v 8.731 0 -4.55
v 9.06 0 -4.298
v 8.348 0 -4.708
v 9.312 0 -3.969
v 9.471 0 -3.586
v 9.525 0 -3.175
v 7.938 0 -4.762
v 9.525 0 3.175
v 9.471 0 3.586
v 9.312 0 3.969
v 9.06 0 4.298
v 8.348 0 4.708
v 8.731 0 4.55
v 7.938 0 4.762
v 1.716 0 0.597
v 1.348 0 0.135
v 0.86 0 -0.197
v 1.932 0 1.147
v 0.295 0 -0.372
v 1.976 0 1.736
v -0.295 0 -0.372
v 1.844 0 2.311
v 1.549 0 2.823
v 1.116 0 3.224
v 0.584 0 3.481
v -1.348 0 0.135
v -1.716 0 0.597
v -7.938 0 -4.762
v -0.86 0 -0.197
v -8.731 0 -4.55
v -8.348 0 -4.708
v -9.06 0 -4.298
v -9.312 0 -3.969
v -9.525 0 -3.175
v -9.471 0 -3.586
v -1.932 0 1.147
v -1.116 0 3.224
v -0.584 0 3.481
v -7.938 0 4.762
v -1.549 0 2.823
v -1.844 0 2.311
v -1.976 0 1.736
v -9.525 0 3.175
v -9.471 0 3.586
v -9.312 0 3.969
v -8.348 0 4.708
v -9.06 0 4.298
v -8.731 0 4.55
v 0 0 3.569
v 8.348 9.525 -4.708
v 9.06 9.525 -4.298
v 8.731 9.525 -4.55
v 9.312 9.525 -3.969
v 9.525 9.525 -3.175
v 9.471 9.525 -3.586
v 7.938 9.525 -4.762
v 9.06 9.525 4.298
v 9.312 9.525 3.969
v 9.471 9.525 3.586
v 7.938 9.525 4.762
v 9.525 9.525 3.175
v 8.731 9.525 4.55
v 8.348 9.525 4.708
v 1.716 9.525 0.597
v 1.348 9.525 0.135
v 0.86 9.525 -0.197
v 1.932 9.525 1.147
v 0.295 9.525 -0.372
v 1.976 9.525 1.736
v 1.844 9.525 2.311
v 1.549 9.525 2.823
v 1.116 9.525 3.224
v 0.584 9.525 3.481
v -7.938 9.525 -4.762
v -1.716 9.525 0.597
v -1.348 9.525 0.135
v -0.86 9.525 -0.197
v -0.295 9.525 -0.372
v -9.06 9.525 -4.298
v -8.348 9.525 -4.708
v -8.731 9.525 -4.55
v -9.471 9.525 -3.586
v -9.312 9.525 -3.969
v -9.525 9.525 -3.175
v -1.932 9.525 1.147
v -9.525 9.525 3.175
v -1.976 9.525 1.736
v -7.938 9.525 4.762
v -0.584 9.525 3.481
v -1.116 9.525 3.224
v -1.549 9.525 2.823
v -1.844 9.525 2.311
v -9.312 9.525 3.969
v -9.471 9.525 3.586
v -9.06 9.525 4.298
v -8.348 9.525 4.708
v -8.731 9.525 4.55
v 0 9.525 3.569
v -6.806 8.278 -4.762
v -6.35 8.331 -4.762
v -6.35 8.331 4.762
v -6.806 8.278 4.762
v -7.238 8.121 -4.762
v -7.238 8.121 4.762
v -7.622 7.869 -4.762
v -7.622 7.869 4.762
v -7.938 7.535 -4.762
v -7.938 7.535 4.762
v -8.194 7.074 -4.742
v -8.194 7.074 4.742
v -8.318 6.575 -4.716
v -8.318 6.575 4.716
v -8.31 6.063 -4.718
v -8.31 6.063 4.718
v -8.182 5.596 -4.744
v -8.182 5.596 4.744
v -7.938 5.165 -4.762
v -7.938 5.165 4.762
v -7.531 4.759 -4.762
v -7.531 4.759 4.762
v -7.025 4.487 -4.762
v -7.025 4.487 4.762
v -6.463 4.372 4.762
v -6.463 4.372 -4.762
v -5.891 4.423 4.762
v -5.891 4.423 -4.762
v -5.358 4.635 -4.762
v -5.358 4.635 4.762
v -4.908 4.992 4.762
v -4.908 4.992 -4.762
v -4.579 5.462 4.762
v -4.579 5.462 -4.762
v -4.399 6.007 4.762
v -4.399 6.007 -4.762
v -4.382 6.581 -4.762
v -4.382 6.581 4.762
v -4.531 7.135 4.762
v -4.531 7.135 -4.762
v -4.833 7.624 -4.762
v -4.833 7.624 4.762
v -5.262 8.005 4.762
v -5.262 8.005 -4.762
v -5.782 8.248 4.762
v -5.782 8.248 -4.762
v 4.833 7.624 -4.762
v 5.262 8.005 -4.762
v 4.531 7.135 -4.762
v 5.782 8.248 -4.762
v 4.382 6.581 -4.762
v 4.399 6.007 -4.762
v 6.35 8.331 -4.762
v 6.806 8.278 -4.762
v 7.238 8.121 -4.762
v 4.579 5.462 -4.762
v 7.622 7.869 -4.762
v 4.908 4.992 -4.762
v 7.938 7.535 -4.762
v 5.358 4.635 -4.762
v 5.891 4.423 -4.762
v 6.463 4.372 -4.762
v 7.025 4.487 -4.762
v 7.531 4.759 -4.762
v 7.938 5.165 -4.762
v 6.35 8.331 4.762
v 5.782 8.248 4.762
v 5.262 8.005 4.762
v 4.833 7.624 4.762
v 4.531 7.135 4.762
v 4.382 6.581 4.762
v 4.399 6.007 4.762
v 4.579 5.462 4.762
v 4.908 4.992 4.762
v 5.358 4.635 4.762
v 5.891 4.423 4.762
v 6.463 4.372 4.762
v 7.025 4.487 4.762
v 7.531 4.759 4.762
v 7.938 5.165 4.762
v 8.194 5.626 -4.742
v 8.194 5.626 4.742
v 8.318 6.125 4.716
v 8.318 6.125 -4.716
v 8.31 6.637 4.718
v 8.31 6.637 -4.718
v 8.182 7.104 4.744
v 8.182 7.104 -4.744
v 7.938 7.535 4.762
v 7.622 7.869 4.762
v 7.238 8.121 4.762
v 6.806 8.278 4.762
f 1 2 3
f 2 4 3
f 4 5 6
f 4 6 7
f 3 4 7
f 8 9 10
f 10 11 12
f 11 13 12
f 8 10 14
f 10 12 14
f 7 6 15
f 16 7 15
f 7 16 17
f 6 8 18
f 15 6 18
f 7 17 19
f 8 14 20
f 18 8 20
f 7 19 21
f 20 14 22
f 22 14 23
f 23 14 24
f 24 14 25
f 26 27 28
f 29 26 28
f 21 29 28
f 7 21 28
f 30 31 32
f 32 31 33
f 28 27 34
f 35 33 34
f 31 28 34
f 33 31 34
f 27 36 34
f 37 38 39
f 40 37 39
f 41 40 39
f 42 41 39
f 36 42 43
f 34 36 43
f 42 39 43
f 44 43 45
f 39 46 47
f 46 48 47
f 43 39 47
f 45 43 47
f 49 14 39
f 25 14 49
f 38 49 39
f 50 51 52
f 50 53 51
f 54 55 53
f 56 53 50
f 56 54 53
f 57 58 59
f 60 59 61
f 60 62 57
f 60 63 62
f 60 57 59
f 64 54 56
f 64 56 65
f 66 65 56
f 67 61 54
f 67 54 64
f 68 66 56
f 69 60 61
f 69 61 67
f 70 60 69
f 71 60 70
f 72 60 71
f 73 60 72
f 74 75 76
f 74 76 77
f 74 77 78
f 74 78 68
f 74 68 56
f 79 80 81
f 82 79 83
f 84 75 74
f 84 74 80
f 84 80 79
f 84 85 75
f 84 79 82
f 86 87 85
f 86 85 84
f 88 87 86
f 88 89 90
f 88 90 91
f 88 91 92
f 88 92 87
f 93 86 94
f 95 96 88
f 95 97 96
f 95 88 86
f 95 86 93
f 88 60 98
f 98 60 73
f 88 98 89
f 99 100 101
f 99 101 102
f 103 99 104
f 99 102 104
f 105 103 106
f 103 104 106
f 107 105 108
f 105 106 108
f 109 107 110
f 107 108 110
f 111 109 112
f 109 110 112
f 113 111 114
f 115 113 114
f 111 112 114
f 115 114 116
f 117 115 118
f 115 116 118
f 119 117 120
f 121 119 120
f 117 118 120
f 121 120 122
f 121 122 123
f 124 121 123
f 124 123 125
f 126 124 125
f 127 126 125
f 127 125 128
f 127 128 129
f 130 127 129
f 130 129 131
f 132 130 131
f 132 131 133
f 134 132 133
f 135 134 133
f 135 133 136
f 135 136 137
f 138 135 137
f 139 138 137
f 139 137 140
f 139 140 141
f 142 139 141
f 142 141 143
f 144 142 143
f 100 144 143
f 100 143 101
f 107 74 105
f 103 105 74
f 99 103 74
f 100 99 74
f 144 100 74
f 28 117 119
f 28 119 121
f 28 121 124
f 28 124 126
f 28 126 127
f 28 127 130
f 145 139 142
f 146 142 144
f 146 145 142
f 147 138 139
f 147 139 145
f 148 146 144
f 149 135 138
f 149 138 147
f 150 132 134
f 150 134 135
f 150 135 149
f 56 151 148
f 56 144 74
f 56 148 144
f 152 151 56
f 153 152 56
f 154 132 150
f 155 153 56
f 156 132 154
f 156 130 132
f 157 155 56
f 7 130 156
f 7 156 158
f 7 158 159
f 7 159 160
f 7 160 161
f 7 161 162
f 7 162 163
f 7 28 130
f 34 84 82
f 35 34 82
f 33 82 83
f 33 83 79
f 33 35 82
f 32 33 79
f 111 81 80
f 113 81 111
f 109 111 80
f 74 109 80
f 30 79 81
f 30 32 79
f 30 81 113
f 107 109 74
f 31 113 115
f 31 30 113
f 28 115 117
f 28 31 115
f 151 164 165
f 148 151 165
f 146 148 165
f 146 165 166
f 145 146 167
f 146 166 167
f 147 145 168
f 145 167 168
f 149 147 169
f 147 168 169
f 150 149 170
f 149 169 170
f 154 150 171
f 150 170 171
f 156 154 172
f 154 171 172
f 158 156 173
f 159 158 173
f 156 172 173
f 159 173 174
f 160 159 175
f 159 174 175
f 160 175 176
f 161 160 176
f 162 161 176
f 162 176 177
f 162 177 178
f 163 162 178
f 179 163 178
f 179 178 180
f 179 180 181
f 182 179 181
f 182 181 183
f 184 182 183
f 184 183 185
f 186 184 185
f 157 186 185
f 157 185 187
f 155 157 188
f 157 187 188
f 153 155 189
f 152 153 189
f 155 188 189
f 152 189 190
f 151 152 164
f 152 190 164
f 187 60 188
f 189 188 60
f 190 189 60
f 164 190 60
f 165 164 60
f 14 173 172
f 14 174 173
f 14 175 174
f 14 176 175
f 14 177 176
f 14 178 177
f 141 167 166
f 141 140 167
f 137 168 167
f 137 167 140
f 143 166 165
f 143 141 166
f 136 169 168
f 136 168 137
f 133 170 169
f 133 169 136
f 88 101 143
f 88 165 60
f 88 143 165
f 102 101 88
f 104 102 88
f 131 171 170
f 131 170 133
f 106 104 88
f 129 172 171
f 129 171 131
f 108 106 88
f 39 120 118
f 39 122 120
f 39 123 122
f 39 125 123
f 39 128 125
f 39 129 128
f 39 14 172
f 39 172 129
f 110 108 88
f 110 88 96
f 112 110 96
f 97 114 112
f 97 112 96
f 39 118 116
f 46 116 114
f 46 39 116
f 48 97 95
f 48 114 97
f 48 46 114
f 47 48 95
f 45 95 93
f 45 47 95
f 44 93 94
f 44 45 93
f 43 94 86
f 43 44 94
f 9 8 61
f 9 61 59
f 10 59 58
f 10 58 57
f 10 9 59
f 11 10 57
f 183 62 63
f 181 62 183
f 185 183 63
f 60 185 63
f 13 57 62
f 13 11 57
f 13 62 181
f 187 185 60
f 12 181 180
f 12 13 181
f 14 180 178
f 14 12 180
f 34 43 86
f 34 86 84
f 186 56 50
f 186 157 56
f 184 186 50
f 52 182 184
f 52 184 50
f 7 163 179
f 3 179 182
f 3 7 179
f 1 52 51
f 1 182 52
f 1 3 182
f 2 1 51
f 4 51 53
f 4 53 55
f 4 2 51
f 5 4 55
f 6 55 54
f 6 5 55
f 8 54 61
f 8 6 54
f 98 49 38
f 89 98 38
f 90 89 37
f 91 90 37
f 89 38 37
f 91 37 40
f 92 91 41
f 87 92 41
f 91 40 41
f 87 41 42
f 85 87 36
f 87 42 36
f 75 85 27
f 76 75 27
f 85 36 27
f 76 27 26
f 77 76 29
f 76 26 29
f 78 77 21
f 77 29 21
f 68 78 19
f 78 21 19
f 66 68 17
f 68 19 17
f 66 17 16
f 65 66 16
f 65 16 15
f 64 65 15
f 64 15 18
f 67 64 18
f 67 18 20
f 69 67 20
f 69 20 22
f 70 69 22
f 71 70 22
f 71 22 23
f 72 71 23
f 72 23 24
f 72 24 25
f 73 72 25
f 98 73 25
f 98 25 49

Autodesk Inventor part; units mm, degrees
ref_plane "YZ Plane" through (0, 0, 0) normal (1, 0, 0) x (0, 1, 0)
ref_plane "XZ Plane" through (0, 0, 0) normal (0, 1, 0) x (-1, 0, 0)
ref_plane "XY Plane" through (0, 0, 0) normal (0, 0, 1) x (1, 0, 0)
sketch "Sketch1" plane through (0, 0, 0) normal (0, 1, 0) x (-1, 0, 0)
  line L0 (-9.525, 4.7625) -> (9.525, 4.7625)
  line L1 (9.525, 4.7625) -> (9.525, -4.7625)
  line L2 (9.525, -4.7625) -> (-9.525, -4.7625)
  line L3 (-9.525, -4.7625) -> (-9.525, 4.7625)
  line L4 (-9.525, 4.7625) -> (9.525, -4.7625) construction
  line L5 (9.525, 4.7625) -> (-9.525, -4.7625) construction
  point P0 (0, 0)
  dimension "d0" = 19.05
  dimension "d1" = 9.525
extrude "Plate1" add sketch "Sketch1" along normal blind 9.525
sketch "Sketch2" plane through (9.525, 0, -4.7625) normal (0, 0, -1) x (-1, 0, 0)
  line L0 (0, 0) -> (19.05, 0) construction
  line L1 (9.525, 0) -> (9.525, 9.525) construction
  line L2 (19.05, 9.525) -> (0, 9.525) construction
  point P0 (3.175, 6.35)
  point P1 (15.875, 6.35)
  dimension "d3" = 12.7
  dimension "d4" = 6.35
hole "Hole1" at (6.35, 6.35, -4.7625) at (-6.35, 6.35, -4.7625) direction (0, 0, 1) diameter 3.9624 end through all thread size "10-32 UNF" class "2B" standard "ANSI Unified Screw Threads"
sketch "Sketch3" plane through (0, 9.525, 0) normal (0, 1, 0) x (1, 0, 0)
  line L0 (-9.525, 4.7625) -> (9.525, 4.7625) projected
  point P0 (0, 0)
  point P1 (0, -1.5875)
  dimension "d19" = 6.35
hole "Hole2" at (0, 9.525, 1.5875) direction (0, -1, 0) diameter 3.9624 end through all thread size "10-32 UNF" class "2B" standard "ANSI Unified Screw Threads"
fillet "Corner Round1" radius 1.5875 4 edges at (-9.525, 4.7625, -4.7625) (-9.525, 4.7625, 4.7625) (9.525, 4.7625, -4.7625) (9.525, 4.7625, 4.7625)
equation "\"d10\" = Thickness"
equation "\"d2\" = Thickness"
equation "\"BendRadius\" = Thickness"
equation "\"BendReliefWidth\" = Thickness"
equation "\"BendReliefDepth\" = 0.5 * Thickness"
equation "\"CornerReliefSize\" = 4 * Thickness"
equation "\"MinimumRemnant\" = 2 * Thickness"
equation "\"TransitionRadius\" = BendRadius"
equation "\"JacobiRadiusSize\" = BendRadius"
equation "\"GapSize\" = Thickness"
equation "\"Thickness\" = 9.525"
properties part number "PLATE,NUTBLOCK,BACK" material "Aluminum 6061"
